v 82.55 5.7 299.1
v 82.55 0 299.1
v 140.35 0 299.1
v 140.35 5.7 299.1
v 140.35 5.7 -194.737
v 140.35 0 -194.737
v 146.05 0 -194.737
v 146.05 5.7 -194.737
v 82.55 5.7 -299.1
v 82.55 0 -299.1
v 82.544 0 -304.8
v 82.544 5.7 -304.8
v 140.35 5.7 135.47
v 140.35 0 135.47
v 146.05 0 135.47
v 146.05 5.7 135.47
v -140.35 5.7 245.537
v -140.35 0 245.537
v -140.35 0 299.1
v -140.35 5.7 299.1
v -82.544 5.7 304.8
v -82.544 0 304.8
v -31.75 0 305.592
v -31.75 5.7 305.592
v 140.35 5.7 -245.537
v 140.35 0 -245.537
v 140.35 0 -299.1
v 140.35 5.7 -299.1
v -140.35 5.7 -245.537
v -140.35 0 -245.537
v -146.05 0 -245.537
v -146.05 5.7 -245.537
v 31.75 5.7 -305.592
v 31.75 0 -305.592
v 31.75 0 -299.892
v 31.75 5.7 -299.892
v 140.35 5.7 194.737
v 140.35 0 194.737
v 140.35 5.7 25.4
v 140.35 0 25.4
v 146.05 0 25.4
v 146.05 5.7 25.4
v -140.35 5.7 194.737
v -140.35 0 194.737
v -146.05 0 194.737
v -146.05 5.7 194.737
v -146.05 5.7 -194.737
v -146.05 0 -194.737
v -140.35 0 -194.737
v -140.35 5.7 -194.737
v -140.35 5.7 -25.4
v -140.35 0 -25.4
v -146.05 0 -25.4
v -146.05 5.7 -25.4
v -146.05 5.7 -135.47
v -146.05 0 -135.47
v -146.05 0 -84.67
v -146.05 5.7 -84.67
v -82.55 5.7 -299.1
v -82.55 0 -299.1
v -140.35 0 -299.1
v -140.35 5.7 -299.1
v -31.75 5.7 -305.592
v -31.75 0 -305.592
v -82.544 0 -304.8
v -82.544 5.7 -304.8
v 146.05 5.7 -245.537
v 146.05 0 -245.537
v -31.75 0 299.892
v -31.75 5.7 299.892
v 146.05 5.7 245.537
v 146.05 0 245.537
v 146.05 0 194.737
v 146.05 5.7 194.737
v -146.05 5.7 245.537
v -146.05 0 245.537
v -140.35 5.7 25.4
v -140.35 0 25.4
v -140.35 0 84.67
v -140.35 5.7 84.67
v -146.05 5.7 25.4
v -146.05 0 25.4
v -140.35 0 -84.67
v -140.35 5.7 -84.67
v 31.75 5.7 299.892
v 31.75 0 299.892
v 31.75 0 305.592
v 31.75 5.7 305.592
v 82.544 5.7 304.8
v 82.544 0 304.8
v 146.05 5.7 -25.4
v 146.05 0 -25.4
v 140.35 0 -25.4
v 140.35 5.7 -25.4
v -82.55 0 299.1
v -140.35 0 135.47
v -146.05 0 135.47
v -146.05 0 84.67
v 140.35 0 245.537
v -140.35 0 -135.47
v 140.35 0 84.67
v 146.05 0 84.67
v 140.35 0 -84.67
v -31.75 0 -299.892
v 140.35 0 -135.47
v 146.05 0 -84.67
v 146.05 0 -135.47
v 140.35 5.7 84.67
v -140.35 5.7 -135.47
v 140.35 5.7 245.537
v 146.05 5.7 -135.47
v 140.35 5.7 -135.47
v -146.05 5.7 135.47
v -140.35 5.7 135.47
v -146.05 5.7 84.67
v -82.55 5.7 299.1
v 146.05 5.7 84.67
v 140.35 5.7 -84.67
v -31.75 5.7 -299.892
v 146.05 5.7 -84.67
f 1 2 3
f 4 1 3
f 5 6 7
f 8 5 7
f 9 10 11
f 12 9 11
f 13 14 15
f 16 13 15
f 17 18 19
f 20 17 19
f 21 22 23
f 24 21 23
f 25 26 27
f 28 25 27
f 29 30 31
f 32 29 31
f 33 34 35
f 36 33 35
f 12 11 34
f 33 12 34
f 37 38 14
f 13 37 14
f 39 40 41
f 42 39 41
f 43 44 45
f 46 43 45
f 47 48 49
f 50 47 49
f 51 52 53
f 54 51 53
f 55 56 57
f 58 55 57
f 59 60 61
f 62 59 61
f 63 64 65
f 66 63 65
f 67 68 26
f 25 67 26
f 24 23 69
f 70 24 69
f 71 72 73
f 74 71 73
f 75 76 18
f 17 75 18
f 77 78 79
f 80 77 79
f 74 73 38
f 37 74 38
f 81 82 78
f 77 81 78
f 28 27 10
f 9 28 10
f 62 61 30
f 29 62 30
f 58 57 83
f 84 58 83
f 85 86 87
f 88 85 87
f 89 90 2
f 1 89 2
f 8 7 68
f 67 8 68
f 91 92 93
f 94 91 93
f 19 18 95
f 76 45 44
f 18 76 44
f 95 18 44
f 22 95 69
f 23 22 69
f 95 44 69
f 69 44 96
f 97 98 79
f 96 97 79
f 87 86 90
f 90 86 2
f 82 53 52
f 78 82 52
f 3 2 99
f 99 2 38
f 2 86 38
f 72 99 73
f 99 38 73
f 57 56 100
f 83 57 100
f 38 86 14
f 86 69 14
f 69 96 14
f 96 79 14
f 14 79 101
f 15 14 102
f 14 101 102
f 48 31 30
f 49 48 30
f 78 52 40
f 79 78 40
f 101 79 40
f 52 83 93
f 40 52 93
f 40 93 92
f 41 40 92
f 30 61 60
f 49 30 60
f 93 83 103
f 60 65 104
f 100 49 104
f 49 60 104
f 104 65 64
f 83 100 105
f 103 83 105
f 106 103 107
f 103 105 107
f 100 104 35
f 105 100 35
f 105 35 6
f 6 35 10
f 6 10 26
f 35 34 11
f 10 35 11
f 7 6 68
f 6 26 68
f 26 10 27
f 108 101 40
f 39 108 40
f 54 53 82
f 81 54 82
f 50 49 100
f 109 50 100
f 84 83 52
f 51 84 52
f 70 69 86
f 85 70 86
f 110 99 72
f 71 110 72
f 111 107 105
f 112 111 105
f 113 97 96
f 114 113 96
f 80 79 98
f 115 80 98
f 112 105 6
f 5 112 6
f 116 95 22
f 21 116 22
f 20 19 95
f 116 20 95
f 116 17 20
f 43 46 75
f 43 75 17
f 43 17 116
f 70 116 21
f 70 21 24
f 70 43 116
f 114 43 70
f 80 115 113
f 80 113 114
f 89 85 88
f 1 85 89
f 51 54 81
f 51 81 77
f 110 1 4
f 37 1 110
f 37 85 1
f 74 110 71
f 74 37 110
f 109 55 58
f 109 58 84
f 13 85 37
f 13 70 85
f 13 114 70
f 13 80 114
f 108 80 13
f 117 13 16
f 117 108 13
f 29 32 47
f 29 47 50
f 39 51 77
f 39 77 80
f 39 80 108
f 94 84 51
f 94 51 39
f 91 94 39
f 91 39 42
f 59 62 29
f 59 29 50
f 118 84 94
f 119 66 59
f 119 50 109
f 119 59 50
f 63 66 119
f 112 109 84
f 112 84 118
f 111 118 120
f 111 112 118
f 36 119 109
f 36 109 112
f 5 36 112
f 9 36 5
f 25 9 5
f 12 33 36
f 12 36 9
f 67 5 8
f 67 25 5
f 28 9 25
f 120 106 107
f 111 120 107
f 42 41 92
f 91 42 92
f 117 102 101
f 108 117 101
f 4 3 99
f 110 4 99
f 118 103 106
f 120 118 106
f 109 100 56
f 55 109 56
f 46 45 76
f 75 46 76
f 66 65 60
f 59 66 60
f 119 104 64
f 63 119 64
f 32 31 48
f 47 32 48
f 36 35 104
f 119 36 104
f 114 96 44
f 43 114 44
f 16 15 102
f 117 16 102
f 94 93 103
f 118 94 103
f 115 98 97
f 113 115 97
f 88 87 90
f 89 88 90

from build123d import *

# Parameters (mm, degrees)
BOSS_EXTRUDE1_DEPTH = 5.7


with BuildPart() as part:
    # Sketch1 → Boss-Extrude1 (new body)
    with BuildSketch(Plane(origin=(0, 0, 0), x_dir=(1, 0, 0), z_dir=(0, 1, 0))):
        Polygon((31.75, 299.891703858), (-31.75, 299.891703858), (-31.75, 305.591703858), (-82.54382924, 304.79992666), (-82.55, 299.09993), (-140.35, 299.09993), (-140.35, 245.5366), (-146.05, 245.5366), (-146.05, 194.7366), (-140.35, 194.7366), (-140.35, 135.47), (-146.05, 135.47), (-146.05, 84.67), (-140.35, 84.67), (-140.35, 25.4), (-146.05, 25.4), (-146.05, -25.4), (-140.35, -25.4), (-140.35, -84.67), (-146.05, -84.67), (-146.05, -135.47), (-140.35, -135.47), (-140.35, -194.7366), (-146.05, -194.7366), (-146.05, -245.5366), (-140.35, -245.5366), (-140.35, -299.09993), (-82.55, -299.09993), (-82.54382924, -304.79992666), (-31.75, -305.591703858), (-31.75, -299.891703858), (31.75, -299.891703858), (31.75, -305.591703858), (82.54382924, -304.79992666), (82.55, -299.09993), (140.35, -299.09993), (140.35, -245.5366), (146.05, -245.5366), (146.05, -194.7366), (140.35, -194.7366), (140.35, -135.47), (146.05, -135.47), (146.05, -84.67), (140.35, -84.67), (140.35, -25.4), (146.05, -25.4), (146.05, 25.4), (140.35, 25.4), (140.35, 84.67), (146.05, 84.67), (146.05, 135.47), (140.35, 135.47), (140.35, 194.7366), (146.05, 194.7366), (146.05, 245.5366), (140.35, 245.5366), (140.35, 299.09993), (82.55, 299.09993), (82.54382924, 304.79992666), (31.75, 305.591703858), align=None)
    extrude(amount=BOSS_EXTRUDE1_DEPTH)


solid = part.part
